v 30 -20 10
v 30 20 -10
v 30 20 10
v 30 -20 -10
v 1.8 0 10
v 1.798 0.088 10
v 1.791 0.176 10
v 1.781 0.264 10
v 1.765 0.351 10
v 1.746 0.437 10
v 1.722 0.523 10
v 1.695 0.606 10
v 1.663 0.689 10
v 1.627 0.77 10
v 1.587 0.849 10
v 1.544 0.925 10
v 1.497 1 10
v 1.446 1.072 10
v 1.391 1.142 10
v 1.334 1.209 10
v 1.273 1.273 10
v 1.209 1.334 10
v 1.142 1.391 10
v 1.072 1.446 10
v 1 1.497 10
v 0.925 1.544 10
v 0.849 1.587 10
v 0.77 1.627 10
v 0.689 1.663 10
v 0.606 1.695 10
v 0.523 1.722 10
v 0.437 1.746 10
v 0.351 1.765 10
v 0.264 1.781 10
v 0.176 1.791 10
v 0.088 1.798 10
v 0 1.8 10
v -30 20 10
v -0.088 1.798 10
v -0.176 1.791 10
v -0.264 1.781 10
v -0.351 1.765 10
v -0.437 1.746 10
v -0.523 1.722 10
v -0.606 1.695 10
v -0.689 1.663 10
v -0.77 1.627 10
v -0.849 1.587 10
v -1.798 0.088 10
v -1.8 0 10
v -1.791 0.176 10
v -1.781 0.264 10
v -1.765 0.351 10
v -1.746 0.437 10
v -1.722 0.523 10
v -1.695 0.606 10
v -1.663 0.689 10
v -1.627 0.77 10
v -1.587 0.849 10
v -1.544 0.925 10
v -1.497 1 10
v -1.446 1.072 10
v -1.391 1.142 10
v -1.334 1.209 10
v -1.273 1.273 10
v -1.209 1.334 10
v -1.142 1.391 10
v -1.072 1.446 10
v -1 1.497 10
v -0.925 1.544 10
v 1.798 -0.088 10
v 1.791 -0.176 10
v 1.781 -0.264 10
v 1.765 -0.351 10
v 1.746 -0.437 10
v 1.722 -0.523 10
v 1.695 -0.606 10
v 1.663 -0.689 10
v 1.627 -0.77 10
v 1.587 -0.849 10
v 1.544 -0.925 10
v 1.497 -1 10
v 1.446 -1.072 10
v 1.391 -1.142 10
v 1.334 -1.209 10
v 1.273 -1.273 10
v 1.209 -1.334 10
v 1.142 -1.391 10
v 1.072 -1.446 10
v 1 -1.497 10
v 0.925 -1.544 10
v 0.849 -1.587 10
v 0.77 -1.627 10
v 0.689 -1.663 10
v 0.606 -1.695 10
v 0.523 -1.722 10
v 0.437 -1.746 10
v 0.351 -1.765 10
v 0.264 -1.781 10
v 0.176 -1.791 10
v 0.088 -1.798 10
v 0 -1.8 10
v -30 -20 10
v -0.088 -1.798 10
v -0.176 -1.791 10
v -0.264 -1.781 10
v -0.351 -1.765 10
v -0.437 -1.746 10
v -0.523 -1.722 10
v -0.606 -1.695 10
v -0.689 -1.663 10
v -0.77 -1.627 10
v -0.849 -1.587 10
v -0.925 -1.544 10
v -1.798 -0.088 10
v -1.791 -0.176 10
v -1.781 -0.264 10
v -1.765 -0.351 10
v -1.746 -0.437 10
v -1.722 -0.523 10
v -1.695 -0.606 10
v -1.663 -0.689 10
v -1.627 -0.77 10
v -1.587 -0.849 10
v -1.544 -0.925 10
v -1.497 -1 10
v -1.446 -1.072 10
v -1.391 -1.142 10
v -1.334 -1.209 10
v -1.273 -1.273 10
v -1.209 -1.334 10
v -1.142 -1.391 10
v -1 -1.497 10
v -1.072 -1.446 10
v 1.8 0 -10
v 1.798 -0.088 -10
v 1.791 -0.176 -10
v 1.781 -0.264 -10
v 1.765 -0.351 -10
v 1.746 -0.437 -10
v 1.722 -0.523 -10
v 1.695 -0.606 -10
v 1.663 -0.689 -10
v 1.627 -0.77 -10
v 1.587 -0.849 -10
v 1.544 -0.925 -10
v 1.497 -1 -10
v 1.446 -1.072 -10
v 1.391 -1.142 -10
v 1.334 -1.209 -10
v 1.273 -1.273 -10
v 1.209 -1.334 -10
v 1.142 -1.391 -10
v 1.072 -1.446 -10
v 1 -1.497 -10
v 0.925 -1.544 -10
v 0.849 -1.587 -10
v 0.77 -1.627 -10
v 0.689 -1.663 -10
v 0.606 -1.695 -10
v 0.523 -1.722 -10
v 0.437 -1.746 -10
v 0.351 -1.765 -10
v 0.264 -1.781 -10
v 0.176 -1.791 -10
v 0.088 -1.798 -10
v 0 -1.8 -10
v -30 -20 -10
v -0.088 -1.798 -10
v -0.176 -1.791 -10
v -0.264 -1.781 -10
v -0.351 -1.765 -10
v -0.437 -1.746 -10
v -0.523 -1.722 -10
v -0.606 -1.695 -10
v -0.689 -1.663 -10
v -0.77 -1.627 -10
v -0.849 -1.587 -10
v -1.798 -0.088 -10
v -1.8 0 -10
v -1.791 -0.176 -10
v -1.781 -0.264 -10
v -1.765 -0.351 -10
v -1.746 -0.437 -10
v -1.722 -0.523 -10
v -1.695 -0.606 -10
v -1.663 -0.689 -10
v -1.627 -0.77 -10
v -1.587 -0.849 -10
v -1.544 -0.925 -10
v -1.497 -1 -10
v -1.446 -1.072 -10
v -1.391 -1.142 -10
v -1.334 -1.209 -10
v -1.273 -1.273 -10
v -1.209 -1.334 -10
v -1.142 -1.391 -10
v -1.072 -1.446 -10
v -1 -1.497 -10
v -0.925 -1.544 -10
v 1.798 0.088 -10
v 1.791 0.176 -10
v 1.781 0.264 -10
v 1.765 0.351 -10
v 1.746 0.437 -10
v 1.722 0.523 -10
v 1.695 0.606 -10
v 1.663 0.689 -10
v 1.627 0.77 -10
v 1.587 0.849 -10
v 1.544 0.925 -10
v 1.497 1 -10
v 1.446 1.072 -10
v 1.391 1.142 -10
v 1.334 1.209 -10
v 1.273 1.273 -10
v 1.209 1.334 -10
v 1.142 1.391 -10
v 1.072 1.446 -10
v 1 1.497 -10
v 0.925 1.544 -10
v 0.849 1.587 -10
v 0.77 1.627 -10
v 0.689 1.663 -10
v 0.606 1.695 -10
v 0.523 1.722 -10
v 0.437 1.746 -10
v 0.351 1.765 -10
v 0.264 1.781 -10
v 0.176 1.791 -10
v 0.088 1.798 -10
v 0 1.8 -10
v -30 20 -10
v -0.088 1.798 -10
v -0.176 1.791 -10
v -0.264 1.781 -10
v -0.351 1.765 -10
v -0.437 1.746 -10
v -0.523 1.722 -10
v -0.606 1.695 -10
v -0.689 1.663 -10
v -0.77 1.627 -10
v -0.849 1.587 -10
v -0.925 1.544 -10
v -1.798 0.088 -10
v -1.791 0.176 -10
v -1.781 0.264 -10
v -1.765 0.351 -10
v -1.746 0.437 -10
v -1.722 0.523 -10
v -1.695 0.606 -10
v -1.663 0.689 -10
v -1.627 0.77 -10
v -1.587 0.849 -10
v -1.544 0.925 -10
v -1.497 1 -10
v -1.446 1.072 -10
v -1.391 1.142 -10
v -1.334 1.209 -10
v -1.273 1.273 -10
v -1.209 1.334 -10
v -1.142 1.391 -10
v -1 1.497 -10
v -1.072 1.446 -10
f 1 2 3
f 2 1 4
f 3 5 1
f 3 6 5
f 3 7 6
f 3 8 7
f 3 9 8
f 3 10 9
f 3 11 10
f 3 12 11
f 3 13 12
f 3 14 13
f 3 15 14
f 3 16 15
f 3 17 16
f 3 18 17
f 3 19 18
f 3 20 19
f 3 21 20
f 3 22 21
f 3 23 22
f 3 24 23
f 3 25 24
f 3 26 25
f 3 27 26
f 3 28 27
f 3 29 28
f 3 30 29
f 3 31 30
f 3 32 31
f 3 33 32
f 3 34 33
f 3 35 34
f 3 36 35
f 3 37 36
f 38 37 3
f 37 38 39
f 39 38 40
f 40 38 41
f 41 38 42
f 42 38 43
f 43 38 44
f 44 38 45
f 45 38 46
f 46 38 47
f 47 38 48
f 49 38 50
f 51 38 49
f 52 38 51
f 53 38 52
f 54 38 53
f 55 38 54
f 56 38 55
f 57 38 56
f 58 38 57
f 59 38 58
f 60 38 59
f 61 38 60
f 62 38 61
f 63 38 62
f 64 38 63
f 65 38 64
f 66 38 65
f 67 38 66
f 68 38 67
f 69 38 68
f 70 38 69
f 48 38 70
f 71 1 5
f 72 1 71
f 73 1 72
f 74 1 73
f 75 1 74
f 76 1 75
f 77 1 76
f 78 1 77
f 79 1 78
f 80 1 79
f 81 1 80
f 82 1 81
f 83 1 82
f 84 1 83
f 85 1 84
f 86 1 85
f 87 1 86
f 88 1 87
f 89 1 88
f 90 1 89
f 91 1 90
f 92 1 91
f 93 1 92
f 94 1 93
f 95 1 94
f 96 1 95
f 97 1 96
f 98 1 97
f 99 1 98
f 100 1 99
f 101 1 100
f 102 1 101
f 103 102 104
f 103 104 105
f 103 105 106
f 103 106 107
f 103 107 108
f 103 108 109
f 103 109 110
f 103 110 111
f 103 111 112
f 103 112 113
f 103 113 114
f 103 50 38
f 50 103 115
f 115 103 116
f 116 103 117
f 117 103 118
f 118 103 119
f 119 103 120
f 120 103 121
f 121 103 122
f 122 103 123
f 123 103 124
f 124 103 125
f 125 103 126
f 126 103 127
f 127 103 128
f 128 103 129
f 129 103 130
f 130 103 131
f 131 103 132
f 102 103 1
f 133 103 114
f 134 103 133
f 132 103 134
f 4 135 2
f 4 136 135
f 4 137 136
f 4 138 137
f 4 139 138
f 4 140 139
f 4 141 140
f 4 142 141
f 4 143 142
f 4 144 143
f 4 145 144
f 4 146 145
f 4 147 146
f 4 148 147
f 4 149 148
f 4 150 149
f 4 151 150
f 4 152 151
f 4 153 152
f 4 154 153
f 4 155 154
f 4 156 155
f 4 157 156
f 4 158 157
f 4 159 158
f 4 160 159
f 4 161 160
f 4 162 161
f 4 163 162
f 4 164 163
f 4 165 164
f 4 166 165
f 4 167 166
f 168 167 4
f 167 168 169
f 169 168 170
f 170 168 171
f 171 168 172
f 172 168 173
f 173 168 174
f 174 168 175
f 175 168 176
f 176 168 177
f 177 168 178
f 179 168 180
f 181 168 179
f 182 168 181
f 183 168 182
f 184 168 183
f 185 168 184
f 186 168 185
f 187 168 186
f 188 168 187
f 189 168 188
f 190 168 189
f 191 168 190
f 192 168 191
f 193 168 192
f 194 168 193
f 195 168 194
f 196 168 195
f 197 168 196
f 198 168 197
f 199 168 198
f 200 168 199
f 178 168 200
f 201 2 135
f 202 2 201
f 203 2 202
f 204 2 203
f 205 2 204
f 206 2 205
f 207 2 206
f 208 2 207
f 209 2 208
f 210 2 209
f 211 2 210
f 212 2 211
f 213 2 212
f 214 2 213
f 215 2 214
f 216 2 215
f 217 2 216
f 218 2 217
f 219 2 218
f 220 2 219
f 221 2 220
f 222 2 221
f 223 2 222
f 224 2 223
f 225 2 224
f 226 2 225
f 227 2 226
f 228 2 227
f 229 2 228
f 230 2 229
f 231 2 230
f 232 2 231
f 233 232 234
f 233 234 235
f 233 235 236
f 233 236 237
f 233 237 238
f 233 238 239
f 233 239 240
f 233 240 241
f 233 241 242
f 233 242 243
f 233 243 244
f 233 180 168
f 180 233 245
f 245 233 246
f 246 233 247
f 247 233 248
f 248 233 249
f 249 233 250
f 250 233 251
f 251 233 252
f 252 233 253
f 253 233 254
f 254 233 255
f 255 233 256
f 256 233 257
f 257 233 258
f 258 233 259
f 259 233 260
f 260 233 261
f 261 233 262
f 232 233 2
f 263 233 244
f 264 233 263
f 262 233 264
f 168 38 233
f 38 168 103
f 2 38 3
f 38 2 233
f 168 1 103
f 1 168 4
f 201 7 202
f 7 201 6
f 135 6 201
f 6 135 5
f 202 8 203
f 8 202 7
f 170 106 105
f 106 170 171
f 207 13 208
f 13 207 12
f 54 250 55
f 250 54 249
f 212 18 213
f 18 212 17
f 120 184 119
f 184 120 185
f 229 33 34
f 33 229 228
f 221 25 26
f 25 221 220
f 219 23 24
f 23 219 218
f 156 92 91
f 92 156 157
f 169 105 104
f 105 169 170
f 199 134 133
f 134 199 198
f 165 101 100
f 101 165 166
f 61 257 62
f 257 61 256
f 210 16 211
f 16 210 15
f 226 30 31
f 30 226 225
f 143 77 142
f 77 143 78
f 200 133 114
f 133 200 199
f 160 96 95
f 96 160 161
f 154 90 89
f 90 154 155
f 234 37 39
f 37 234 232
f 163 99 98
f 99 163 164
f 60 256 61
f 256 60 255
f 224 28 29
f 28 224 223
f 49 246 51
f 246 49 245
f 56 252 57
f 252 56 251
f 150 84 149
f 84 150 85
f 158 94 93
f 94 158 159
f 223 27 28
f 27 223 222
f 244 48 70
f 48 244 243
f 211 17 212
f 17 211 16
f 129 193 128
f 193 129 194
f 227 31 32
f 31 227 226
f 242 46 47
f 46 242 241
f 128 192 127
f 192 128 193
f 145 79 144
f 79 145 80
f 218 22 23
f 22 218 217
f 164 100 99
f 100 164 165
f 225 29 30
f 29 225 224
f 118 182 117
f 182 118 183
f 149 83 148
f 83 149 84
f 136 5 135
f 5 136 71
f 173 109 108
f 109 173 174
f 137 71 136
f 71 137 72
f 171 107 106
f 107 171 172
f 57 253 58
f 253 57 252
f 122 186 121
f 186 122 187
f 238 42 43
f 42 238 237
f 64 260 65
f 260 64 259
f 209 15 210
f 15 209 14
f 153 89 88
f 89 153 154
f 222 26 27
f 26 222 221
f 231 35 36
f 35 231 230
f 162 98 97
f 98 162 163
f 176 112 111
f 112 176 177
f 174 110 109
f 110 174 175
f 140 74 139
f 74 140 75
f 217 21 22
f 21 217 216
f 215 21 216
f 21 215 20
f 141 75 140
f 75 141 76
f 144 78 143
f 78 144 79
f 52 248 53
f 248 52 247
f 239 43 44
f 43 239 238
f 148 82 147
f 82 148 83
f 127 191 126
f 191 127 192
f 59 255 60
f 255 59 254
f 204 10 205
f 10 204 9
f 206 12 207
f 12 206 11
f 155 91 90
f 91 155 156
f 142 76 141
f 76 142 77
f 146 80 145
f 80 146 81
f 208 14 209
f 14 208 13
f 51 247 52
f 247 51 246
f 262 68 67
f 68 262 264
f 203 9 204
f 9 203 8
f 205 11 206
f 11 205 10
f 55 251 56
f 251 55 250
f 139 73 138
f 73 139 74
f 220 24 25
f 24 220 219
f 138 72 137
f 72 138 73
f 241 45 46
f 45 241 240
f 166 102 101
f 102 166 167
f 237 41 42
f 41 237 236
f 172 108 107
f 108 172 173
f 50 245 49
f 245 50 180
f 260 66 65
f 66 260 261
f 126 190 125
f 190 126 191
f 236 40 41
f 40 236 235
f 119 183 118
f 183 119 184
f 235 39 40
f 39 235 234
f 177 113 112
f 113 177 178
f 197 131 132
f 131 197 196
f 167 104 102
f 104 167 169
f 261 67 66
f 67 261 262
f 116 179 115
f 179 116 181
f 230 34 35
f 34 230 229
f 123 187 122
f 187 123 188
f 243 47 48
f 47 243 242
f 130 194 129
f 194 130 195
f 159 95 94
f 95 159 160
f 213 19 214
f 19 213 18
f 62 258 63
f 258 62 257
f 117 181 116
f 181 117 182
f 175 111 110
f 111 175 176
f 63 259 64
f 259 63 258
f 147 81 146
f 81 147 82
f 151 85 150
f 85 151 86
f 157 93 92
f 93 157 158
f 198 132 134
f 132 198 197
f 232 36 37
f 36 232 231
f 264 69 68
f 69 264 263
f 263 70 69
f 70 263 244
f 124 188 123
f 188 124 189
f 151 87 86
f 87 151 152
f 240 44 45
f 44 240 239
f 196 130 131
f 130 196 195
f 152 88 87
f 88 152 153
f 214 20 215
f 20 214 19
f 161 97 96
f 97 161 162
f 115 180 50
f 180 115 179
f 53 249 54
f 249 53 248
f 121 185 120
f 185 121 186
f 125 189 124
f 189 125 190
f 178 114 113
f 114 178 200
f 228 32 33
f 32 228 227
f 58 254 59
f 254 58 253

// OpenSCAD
// =============================================================================
// OpenSCAD Parametric Template
// Project: [Project Name]
// =============================================================================

/* [Main Dimensions] */
PART_WIDTH  = 60.0;
PART_DEPTH  = 40.0;
PART_HEIGHT = 20.0;
WALL_THICK  = 3.5;
CHAMFER     = 2.0;

/* [Fasteners & Tolerances] */
SCREW_DIA   = 3.6; // M3 clearance
TOLERANCE   = 0.4; // 3D print fit clearance

/* [Resolution] */
$fn = $preview ? 32 : 128;

module base_part() {
    difference() {
        // Outer body
        cube([PART_WIDTH, PART_DEPTH, PART_HEIGHT], center = true);

        // Center mounting hole
        cylinder(r = SCREW_DIA / 2, h = PART_HEIGHT + 2.0, center = true);
    }
}

// Render
base_part();
